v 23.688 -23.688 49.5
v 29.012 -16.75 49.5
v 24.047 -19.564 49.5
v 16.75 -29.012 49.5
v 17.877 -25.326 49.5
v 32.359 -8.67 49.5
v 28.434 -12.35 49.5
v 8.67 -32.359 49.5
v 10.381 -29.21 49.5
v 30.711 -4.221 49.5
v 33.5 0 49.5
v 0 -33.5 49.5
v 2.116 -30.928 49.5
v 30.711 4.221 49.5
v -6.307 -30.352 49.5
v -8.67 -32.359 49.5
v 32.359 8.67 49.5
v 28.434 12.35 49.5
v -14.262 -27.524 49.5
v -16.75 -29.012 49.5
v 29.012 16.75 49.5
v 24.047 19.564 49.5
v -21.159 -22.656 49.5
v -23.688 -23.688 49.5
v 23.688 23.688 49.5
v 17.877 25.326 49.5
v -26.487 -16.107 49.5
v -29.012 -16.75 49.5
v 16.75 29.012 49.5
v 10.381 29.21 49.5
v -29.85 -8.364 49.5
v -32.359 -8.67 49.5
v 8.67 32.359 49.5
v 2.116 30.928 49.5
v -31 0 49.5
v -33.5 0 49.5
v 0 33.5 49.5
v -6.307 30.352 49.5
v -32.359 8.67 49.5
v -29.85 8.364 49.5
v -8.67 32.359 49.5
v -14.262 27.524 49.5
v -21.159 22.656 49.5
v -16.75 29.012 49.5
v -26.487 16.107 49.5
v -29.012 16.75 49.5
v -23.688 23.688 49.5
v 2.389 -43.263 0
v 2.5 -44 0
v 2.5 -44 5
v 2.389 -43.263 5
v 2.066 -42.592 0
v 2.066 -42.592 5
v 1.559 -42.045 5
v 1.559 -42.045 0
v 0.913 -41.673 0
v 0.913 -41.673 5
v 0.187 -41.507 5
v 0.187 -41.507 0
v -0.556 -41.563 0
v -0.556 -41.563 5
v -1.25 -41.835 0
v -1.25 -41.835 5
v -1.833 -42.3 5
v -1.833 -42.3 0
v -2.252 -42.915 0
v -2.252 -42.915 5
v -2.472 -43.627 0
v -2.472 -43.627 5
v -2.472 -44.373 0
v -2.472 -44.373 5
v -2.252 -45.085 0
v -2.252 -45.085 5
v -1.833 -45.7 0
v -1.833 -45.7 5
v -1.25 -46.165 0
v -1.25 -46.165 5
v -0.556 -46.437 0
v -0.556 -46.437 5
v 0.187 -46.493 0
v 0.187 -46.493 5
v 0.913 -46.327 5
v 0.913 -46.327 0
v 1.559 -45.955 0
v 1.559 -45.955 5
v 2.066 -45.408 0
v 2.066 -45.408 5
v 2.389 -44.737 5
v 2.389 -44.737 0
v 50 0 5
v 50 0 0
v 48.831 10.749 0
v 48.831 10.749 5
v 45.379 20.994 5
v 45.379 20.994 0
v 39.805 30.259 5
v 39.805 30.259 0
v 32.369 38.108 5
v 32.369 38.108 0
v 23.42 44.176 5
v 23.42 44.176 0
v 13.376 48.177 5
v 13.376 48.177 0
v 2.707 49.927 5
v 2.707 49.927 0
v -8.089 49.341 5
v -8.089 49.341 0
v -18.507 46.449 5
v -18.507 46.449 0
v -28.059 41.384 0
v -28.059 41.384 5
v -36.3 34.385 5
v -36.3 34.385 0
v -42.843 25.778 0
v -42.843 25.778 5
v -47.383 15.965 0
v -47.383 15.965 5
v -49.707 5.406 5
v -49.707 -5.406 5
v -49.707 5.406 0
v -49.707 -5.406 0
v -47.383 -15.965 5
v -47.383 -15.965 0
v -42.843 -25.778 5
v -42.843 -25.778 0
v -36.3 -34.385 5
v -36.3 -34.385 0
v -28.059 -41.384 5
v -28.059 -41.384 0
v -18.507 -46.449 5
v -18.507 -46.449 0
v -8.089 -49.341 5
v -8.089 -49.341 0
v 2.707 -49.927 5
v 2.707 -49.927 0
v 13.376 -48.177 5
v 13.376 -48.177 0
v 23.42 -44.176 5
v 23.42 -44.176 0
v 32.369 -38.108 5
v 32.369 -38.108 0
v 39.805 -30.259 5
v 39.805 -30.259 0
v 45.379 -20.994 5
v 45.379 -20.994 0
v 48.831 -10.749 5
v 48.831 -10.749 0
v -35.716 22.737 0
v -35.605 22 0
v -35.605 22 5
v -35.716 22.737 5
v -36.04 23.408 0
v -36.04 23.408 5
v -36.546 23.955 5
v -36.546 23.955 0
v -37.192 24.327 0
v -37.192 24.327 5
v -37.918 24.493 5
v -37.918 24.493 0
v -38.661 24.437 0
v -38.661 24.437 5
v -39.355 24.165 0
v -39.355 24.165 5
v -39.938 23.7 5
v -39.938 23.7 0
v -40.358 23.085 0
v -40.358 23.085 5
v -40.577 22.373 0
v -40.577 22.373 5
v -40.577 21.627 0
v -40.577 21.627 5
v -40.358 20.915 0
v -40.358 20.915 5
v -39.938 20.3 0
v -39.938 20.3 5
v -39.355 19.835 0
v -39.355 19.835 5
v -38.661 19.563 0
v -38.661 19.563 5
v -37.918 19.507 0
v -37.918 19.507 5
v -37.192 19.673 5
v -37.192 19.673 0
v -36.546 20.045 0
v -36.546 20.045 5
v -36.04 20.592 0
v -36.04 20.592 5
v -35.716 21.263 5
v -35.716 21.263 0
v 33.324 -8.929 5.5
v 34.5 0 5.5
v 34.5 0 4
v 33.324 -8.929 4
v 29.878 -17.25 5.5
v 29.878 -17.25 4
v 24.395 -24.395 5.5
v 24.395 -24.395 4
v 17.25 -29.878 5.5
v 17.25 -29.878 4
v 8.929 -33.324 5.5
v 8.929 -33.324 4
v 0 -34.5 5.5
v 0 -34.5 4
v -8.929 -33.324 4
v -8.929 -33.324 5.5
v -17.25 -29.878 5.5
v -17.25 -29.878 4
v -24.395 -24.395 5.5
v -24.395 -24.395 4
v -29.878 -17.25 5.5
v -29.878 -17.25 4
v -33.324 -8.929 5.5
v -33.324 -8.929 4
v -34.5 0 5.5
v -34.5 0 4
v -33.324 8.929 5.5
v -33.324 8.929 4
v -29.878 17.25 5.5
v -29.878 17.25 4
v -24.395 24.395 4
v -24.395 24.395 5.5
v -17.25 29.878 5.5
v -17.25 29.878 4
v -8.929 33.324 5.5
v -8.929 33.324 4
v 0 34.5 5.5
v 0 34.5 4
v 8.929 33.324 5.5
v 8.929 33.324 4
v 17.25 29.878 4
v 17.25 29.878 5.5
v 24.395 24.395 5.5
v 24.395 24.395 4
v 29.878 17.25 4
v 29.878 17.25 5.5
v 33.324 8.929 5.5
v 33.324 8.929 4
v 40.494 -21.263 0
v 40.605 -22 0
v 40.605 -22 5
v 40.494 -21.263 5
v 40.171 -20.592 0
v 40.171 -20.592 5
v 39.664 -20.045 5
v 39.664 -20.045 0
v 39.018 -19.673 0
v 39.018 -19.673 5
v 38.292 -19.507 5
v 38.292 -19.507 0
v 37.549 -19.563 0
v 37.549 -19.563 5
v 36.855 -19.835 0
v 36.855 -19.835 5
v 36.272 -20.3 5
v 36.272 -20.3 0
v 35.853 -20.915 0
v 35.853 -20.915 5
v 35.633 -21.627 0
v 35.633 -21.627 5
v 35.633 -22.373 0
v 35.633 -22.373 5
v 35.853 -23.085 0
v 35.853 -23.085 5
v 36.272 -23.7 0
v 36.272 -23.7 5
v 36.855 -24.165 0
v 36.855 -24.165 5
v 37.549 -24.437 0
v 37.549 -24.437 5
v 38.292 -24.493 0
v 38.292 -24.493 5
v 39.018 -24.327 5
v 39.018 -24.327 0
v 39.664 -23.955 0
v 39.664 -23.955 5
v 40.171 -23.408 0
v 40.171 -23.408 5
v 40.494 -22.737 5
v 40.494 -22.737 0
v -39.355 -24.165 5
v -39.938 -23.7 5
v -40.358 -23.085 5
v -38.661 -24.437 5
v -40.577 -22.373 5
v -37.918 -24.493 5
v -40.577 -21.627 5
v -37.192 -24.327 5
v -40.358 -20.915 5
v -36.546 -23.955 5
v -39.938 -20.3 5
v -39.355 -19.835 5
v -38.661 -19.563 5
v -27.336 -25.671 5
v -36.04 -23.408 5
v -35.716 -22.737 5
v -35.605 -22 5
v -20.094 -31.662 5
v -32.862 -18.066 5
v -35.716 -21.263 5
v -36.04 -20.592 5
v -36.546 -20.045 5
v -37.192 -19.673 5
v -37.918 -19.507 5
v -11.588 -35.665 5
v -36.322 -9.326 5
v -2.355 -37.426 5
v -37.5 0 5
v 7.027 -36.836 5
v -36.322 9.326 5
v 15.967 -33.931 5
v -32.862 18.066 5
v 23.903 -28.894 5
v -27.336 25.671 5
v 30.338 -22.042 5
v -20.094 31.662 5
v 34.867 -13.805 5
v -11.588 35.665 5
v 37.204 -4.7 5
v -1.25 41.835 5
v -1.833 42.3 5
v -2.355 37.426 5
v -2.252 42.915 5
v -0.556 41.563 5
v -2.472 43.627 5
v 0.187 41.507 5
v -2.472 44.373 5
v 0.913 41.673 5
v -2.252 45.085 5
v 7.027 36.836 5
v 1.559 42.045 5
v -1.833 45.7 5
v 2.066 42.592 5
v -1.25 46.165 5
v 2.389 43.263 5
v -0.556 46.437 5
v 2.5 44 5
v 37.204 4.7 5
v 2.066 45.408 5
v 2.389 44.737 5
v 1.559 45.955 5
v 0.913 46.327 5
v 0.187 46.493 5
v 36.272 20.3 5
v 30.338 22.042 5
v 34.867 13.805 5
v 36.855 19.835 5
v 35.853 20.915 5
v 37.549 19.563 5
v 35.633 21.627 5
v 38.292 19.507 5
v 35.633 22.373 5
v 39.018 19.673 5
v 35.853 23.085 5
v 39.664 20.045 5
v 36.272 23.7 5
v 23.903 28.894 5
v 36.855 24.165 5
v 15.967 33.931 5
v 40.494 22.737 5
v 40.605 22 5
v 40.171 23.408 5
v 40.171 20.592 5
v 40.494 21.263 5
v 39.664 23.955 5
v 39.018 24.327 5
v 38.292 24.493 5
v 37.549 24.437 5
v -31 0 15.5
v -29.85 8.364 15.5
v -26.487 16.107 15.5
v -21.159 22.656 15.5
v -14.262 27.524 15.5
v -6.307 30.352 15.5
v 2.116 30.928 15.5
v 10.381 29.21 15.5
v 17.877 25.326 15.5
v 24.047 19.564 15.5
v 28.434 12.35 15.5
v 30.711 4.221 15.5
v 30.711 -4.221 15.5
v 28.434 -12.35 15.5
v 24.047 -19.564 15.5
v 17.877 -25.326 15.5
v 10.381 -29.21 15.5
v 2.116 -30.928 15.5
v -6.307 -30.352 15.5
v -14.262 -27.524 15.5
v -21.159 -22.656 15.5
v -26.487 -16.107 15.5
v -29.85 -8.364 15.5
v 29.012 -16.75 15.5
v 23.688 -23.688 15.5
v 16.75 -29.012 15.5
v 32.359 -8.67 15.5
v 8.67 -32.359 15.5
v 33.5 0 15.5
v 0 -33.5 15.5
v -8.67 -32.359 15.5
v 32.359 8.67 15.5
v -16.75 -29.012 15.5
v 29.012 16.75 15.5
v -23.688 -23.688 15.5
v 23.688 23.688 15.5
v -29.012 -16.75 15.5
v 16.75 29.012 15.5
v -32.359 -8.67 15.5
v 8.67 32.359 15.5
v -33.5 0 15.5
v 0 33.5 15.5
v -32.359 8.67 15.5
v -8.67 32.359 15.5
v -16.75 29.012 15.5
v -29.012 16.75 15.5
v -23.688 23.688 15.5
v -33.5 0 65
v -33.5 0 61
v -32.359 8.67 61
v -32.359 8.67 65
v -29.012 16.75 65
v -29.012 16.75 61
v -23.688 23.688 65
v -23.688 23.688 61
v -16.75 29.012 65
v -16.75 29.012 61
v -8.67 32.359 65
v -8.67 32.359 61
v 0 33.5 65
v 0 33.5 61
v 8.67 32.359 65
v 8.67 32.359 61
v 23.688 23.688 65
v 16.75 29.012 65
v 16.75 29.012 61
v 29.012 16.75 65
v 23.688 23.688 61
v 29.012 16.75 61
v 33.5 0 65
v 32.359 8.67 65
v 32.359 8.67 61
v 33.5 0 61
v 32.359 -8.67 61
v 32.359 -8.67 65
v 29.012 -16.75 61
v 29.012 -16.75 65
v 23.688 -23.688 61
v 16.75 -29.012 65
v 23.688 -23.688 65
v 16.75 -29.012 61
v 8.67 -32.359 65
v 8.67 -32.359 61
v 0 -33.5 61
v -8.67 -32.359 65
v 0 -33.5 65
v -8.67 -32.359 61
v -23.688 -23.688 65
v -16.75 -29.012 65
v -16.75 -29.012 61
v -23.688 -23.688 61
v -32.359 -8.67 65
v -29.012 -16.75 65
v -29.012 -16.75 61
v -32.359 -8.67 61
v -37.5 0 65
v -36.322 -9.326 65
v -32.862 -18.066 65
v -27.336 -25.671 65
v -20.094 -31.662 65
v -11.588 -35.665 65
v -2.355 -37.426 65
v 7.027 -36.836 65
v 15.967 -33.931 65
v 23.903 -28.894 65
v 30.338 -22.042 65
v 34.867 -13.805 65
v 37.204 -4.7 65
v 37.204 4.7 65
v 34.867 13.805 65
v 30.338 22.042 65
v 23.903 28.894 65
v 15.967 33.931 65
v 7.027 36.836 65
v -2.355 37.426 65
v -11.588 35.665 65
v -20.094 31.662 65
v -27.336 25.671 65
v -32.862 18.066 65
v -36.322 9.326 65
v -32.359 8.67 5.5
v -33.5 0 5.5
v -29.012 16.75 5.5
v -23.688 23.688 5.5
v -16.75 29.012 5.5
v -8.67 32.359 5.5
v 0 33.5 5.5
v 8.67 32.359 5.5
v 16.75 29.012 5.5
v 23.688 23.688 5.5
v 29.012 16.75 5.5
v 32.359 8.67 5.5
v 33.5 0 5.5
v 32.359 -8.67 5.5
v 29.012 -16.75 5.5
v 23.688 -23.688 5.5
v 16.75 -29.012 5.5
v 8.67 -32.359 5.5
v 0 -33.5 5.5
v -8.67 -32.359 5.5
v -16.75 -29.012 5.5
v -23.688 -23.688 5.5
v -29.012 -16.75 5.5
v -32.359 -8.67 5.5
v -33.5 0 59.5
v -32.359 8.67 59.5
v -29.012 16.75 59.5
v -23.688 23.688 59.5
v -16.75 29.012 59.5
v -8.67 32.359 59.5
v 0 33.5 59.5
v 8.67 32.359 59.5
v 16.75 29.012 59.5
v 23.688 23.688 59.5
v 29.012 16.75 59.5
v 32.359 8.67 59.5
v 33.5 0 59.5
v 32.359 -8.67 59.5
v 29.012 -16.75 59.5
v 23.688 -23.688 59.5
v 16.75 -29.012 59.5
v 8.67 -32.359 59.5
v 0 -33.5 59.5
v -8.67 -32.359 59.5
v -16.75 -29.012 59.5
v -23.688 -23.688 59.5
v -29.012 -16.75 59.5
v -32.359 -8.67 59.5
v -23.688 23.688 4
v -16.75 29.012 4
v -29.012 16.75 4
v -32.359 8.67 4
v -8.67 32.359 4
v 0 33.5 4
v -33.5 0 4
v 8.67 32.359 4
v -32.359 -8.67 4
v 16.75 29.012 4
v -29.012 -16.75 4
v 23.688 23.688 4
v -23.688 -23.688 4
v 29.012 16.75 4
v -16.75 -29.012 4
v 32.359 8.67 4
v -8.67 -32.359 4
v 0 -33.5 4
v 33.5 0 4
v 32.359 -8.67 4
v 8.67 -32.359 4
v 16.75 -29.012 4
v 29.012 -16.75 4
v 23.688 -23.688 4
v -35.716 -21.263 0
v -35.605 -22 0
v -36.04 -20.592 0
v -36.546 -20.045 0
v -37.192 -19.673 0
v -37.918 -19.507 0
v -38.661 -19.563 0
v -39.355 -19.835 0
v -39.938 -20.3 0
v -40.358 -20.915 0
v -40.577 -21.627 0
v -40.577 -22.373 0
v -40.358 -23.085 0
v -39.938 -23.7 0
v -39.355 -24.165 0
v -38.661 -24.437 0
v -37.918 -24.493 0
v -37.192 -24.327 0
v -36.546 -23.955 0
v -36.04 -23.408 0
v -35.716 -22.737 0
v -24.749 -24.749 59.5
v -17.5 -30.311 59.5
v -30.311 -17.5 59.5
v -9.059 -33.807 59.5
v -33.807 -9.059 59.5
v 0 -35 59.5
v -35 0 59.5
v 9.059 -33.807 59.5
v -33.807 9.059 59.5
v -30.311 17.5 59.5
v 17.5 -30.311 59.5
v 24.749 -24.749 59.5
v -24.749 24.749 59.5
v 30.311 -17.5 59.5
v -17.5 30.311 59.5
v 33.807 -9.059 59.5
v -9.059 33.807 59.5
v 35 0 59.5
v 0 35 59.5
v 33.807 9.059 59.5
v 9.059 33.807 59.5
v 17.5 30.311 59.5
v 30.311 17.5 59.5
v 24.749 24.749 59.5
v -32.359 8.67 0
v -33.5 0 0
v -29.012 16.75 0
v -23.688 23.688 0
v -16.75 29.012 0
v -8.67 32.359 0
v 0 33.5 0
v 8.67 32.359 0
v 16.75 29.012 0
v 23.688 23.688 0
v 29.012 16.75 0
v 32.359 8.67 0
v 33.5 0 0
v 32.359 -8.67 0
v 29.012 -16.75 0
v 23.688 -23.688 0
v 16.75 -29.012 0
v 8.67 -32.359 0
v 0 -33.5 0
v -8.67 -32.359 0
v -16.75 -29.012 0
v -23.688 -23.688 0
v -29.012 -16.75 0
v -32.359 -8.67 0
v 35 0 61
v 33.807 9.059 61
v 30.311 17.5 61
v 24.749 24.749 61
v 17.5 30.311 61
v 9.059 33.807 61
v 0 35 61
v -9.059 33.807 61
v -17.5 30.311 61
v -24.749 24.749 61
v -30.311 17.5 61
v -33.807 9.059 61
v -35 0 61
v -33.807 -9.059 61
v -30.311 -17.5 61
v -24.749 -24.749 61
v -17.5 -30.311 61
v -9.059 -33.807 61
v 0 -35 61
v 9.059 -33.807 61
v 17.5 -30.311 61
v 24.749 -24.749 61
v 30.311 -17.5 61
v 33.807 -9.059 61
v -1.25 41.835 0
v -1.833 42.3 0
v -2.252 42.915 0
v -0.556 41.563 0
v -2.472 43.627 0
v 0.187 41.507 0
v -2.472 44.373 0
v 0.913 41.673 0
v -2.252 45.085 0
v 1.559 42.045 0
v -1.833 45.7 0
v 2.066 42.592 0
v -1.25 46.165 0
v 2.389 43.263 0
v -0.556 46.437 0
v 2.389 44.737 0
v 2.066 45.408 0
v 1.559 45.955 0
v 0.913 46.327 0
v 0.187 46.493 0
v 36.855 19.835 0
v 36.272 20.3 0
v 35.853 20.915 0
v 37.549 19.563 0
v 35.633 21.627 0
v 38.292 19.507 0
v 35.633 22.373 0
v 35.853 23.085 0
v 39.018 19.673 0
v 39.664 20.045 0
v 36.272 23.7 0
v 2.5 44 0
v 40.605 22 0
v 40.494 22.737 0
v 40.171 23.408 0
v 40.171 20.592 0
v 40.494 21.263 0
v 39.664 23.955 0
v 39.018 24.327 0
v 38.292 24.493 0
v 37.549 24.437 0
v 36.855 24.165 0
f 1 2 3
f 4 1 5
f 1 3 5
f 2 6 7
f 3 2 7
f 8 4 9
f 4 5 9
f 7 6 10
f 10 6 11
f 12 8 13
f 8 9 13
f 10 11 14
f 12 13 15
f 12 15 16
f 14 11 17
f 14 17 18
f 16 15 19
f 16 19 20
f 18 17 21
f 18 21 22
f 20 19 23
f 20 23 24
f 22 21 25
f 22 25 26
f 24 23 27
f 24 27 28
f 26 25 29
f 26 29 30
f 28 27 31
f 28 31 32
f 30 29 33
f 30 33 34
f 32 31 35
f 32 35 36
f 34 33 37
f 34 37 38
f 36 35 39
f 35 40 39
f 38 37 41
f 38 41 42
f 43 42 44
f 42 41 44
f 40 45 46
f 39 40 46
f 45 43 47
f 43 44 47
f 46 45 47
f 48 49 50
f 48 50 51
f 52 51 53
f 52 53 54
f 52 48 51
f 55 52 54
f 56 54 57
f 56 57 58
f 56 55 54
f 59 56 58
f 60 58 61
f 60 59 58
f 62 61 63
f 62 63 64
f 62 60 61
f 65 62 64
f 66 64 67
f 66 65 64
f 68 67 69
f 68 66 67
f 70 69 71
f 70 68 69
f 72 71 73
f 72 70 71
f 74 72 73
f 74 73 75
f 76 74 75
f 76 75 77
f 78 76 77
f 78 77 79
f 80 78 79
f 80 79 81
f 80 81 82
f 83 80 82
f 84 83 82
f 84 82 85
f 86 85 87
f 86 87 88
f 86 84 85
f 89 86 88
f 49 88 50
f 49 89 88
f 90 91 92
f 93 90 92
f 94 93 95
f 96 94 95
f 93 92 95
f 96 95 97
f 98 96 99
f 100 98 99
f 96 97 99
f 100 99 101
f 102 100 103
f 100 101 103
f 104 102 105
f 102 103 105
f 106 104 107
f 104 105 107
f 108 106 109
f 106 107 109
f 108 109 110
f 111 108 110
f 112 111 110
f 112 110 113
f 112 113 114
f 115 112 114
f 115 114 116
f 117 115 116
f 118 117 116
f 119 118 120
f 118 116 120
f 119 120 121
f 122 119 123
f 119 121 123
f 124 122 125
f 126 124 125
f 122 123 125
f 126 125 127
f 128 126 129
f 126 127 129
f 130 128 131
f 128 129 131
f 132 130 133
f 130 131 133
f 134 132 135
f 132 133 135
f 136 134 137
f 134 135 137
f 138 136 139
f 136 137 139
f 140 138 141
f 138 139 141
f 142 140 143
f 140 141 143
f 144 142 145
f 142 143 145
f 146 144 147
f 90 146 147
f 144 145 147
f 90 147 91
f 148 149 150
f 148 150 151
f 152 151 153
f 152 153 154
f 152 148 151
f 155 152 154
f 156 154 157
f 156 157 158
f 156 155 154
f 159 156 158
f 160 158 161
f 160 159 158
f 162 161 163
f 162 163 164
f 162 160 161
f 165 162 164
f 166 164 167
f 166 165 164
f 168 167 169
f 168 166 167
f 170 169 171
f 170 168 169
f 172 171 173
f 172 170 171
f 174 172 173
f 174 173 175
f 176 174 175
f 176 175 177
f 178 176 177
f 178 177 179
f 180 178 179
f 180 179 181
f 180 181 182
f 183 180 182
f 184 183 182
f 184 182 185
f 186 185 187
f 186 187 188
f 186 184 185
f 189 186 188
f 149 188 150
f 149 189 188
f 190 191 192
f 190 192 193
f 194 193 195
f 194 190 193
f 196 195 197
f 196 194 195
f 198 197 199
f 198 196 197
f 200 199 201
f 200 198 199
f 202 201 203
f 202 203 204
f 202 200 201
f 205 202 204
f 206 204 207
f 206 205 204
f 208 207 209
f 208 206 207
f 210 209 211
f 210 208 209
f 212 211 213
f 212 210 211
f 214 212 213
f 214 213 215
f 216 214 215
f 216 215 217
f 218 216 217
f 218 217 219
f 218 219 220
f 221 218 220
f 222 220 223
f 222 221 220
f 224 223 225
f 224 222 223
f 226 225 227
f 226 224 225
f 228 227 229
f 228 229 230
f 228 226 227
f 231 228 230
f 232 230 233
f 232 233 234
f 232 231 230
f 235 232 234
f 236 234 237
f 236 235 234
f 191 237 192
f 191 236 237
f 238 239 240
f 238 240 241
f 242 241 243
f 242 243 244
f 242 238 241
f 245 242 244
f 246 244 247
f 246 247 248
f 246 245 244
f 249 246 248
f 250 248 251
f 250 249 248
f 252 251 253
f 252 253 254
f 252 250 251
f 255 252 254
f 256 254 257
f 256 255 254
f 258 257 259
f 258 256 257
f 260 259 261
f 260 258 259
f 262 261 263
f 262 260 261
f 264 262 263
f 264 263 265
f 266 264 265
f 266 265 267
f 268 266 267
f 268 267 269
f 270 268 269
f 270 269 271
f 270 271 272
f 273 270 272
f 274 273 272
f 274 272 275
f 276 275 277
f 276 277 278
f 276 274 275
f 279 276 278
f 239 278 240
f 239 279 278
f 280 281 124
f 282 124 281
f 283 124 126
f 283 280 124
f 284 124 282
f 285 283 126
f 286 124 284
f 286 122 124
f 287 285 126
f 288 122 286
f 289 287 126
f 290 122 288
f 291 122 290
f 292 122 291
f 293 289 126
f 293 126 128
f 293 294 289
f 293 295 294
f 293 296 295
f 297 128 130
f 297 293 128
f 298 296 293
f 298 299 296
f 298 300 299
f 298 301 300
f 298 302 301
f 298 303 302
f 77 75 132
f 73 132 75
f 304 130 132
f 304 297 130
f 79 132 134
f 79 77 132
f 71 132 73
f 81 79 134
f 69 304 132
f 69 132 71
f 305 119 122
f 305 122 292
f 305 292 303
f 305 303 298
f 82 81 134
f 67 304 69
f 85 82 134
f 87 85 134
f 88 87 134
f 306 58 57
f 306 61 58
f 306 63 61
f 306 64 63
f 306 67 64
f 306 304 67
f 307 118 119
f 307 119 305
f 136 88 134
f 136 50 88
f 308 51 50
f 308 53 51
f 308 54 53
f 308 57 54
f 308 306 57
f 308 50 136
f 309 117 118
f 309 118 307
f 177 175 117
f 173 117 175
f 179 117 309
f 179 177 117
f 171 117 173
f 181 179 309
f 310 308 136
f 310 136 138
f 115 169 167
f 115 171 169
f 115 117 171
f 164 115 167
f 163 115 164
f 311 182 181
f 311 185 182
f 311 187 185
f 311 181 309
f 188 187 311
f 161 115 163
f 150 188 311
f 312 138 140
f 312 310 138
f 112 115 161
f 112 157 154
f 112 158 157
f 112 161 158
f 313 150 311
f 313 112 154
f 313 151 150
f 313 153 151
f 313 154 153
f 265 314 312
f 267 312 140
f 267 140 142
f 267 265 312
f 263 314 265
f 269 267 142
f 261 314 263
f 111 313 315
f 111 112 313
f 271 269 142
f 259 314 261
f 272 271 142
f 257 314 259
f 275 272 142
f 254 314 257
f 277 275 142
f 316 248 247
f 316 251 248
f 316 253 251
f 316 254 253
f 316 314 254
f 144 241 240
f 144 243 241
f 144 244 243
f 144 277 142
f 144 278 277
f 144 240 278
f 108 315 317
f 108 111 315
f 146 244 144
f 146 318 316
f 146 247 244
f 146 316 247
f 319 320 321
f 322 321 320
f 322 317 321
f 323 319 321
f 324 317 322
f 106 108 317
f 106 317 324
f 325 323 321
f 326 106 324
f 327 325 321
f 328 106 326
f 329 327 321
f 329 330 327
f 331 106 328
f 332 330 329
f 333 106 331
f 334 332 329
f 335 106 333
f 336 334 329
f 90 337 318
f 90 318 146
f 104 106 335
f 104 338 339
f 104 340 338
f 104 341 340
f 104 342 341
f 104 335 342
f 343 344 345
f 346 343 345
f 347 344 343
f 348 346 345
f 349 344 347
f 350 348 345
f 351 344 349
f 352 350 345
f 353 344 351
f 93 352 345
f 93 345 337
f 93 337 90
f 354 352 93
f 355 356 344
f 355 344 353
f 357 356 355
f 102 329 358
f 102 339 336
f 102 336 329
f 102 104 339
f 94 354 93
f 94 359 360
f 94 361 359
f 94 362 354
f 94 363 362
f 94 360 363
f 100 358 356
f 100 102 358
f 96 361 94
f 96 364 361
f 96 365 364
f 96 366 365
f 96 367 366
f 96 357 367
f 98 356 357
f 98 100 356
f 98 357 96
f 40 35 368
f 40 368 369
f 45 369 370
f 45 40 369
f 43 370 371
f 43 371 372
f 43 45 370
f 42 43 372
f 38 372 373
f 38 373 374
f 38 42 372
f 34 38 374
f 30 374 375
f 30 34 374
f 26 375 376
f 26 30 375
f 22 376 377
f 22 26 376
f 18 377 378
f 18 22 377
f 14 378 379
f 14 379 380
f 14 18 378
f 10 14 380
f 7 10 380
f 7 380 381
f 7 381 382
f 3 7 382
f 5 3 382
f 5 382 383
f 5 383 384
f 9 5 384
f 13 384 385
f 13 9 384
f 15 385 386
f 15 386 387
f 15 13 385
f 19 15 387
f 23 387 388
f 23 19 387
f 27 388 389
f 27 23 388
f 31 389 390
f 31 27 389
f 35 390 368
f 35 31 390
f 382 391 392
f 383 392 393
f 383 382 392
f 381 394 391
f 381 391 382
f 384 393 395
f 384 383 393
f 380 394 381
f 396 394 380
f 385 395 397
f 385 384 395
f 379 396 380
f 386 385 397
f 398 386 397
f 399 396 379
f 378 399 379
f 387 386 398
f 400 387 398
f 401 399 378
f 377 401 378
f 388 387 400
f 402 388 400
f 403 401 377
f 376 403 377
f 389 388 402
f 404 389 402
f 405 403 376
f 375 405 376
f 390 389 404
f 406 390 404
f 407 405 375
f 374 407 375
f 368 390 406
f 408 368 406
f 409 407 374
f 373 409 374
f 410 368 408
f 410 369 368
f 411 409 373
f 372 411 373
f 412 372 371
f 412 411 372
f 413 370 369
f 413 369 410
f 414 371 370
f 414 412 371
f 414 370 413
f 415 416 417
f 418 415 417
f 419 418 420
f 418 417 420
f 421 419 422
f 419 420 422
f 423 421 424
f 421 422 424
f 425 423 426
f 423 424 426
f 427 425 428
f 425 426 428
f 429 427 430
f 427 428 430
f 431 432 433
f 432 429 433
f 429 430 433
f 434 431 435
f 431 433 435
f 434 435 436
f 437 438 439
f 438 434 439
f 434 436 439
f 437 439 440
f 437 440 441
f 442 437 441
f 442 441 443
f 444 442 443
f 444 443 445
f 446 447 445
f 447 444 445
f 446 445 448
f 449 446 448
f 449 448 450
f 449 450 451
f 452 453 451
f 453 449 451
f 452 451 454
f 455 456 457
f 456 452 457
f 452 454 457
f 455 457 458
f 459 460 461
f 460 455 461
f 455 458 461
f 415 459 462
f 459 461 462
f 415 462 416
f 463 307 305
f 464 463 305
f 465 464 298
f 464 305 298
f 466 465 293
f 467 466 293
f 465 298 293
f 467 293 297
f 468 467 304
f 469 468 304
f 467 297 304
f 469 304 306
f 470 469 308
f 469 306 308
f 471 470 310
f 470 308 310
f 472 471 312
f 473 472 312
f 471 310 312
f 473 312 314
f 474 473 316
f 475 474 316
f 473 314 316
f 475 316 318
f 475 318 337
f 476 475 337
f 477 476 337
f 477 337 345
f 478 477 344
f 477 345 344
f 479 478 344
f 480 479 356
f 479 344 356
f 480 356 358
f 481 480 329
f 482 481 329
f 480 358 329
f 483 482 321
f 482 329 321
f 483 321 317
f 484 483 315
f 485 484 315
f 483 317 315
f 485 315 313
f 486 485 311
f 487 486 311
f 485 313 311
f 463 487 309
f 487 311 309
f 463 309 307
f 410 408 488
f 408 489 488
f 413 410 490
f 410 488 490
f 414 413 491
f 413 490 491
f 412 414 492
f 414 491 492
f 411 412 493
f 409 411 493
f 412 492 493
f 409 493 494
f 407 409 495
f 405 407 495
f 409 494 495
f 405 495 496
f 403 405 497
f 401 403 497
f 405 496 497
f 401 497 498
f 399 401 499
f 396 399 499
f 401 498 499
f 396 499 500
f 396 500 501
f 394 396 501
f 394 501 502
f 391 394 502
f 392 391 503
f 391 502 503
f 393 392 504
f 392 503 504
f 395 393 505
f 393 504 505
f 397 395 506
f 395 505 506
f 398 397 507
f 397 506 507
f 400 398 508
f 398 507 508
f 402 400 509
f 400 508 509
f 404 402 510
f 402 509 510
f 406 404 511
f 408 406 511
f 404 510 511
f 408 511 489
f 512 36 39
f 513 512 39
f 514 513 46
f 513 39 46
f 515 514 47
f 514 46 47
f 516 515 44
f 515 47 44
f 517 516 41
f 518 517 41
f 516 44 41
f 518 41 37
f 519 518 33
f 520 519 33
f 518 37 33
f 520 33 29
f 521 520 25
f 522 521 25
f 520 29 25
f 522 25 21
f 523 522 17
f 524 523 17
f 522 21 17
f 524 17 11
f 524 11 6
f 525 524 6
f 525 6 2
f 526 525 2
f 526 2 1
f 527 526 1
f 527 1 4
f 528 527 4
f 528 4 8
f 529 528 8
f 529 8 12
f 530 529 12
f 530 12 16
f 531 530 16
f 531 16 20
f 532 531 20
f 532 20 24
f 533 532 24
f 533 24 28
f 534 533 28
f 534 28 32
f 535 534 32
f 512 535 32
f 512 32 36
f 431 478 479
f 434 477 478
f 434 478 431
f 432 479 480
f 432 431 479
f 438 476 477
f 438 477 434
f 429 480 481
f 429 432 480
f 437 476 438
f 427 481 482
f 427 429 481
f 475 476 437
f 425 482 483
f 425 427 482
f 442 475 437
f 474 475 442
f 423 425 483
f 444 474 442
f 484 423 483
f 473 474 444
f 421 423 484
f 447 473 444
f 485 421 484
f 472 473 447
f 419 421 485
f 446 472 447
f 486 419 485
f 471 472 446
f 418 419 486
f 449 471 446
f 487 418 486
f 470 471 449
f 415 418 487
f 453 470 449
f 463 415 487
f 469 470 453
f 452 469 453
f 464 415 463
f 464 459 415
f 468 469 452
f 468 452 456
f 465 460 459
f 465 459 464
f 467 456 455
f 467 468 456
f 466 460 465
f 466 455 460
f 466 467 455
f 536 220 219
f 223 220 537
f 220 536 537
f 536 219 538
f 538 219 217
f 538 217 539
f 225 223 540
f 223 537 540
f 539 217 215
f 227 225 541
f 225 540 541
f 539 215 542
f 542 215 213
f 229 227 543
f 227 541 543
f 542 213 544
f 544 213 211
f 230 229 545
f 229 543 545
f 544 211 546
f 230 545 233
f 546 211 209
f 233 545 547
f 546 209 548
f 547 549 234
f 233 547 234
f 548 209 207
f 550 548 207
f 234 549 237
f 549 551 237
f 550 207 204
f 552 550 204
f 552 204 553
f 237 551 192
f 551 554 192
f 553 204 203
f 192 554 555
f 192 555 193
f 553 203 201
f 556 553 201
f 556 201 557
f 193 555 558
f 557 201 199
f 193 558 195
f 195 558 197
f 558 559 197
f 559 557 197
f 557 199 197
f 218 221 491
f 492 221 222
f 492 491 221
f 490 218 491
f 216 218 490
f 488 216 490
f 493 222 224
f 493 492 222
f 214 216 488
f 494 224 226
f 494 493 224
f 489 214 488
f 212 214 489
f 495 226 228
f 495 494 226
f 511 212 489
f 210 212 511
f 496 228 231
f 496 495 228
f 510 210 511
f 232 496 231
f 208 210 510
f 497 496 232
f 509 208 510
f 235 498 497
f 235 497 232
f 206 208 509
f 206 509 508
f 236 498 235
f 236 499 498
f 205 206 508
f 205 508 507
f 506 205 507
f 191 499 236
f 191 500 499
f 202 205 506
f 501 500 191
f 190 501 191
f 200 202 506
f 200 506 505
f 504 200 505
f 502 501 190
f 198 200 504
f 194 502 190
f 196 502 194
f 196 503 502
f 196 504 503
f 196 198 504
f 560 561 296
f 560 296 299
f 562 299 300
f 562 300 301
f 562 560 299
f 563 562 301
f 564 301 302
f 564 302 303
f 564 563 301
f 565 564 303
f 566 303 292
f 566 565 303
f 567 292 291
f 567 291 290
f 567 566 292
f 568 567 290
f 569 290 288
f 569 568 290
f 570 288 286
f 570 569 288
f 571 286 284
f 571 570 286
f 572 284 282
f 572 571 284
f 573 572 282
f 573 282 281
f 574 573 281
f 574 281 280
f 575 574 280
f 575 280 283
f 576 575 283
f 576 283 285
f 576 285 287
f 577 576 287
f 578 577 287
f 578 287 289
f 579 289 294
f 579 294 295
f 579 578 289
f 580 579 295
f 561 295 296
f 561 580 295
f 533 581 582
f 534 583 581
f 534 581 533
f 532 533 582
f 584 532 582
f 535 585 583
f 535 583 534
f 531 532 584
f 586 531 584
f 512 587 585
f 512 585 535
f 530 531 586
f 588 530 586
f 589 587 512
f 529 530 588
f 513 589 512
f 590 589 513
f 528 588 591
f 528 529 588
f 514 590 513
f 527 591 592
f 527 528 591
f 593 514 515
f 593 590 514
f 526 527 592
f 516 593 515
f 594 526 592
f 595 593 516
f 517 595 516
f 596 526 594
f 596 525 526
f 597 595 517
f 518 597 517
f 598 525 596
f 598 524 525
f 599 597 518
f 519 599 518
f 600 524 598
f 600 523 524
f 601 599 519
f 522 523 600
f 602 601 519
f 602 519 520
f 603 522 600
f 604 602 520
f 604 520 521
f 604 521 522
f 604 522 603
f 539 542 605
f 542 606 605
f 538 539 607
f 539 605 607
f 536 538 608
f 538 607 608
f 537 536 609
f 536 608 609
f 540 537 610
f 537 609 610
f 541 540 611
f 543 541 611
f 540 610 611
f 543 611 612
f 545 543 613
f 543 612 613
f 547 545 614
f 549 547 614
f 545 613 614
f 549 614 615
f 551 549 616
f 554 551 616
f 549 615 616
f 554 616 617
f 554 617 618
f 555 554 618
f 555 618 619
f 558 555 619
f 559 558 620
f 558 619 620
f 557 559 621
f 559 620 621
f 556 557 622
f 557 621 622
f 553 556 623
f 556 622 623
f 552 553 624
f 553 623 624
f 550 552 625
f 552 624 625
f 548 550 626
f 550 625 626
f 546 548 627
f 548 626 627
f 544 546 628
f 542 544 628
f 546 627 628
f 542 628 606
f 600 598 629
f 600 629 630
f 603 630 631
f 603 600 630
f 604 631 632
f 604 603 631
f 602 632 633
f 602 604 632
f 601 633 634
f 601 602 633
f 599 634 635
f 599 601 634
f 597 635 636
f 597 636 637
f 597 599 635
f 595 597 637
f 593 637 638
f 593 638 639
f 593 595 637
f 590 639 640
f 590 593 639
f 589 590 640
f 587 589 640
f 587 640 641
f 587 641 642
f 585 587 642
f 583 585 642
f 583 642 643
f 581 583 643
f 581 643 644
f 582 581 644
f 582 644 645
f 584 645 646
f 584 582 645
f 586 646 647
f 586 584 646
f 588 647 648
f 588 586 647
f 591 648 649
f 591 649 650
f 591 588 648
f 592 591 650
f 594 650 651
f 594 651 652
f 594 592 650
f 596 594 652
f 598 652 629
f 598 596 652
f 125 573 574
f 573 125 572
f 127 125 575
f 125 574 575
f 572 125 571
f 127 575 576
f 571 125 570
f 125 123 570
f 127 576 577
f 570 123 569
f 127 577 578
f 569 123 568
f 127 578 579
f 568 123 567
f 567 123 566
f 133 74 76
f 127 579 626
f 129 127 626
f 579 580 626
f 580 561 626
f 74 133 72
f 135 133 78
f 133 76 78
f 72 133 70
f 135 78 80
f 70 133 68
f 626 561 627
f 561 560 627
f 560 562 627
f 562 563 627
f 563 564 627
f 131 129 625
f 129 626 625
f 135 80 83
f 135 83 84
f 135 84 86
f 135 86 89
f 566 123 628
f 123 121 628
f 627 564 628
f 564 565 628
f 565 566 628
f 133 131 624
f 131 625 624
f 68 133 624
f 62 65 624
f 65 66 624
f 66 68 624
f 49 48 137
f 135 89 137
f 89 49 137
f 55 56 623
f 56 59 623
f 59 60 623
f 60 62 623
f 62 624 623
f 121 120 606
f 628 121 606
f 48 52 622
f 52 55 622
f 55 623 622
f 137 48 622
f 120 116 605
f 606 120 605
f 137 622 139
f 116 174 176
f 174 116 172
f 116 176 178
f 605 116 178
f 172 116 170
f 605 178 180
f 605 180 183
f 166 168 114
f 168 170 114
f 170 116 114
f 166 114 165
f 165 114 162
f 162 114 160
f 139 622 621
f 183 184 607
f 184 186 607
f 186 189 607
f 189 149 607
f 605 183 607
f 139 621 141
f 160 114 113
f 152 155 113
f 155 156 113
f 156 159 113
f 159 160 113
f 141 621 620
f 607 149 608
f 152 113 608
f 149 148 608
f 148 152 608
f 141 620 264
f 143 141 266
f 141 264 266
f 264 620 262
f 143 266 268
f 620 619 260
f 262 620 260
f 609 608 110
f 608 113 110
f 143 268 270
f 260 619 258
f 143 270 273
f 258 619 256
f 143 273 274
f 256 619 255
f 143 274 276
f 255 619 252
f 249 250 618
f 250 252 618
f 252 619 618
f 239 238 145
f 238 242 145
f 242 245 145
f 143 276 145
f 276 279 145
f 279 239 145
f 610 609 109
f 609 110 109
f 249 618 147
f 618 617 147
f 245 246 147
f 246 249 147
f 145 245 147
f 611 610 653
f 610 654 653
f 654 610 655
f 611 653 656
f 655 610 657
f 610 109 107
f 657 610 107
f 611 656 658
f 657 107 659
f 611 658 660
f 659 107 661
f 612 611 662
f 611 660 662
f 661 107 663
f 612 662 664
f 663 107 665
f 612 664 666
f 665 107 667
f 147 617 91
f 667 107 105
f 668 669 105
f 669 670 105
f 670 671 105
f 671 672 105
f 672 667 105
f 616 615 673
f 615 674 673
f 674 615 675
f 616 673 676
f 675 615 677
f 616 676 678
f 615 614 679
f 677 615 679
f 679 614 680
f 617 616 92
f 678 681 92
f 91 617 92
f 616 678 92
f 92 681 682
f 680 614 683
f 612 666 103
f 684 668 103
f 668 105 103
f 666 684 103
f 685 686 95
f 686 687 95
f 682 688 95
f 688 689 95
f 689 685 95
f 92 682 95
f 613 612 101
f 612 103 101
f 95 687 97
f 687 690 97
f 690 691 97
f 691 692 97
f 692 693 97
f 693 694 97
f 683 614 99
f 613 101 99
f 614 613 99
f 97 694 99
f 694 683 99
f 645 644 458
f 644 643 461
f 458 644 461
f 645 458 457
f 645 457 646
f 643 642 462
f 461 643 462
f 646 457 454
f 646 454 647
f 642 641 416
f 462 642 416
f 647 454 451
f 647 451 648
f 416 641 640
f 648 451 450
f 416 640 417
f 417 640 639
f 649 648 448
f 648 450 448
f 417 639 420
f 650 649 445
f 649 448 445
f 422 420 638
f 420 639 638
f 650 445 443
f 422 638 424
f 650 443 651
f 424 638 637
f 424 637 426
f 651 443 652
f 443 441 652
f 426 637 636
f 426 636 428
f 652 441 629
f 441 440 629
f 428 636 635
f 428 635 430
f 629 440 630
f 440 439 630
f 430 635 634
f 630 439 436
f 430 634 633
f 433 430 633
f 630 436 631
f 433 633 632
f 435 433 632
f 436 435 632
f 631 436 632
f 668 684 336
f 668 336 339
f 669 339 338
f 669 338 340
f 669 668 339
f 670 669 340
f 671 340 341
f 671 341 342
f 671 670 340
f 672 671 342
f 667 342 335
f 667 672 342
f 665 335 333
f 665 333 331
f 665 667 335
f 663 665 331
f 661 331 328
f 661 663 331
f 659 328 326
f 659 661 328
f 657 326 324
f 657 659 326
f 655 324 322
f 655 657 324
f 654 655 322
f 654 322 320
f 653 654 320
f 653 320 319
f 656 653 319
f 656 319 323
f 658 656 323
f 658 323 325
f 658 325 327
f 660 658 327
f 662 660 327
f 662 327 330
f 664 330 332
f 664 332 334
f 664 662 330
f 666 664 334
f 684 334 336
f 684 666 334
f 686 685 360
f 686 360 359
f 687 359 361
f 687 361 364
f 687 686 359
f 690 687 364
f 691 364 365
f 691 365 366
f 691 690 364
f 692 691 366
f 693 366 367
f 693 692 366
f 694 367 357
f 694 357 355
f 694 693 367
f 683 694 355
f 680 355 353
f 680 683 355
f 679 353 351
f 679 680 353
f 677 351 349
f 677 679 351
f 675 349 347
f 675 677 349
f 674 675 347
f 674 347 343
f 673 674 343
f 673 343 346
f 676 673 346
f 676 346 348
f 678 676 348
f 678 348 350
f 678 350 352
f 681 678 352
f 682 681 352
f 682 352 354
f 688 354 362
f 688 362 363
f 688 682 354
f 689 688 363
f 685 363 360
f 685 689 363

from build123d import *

# Parameters (mm, degrees)
SKETCH1_R                = 50
SKETCH1_R_2              = 2.5
BOSS_EXTRUDE1_DEPTH      = 5
SKETCH2_R                = 37.5
SKETCH2_R_2              = 33.5
BOSS_EXTRUDE2_DEPTH      = 60
SKETCH3_R                = 33.5
CUT_EXTRUDE1_DEPTH       = 50
BOSS_EXTRUDE4_DEPTH      = 17
BOSS_EXTRUDE4_DEPTH_BACK = 17
SKETCH5_R                = 35
SKETCH5_R_2              = 31
CUT_EXTRUDE2_START       = 10
SKETCH6_R                = 34.5
CUT_EXTRUDE2_DEPTH       = 1.5
CUT_EXTRUDE3_START       = 10
SKETCH7_R                = 35
CUT_EXTRUDE3_DEPTH       = 1.5


with BuildPart() as part:
    # Sketch1 → Boss-Extrude1 (new body)
    with BuildSketch(Plane.XY):
        Circle(SKETCH1_R)
        with Locations((0, 44)):
            Circle(SKETCH1_R_2, mode=Mode.SUBTRACT)
        with Locations((38.105117767, 22)):
            Circle(SKETCH1_R_2, mode=Mode.SUBTRACT)
        with Locations((38.105117767, -22)):
            Circle(SKETCH1_R_2, mode=Mode.SUBTRACT)
        with Locations((0, -44)):
            Circle(SKETCH1_R_2, mode=Mode.SUBTRACT)
        with Locations((-38.105117767, -22)):
            Circle(SKETCH1_R_2, mode=Mode.SUBTRACT)
        with Locations((-38.105117767, 22)):
            Circle(SKETCH1_R_2, mode=Mode.SUBTRACT)
    extrude(amount=BOSS_EXTRUDE1_DEPTH)

    # Sketch2 → Boss-Extrude2 (add)
    with BuildSketch(Plane.XY.offset(5)):
        with Locations(Location((0, 0, 0), (0, 0, 180))):
            Circle(SKETCH2_R)
        with Locations(Location((0, 0, 0), (0, 0, 180))):
            Circle(SKETCH2_R_2, mode=Mode.SUBTRACT)
    extrude(amount=BOSS_EXTRUDE2_DEPTH)

    # Sketch3 → Cut-Extrude1 (cut)
    with BuildSketch(Plane(origin=(0, 0, 0), x_dir=(-1, 0, 0), z_dir=(0, 0, -1))):
        Circle(SKETCH3_R)
    extrude(amount=-CUT_EXTRUDE1_DEPTH, mode=Mode.SUBTRACT)

    # Sketch5 → Boss-Extrude4 (add, two sides: drawn at the far end of the back side and taken through both)
    with BuildSketch(Plane(origin=(0, 0, 32.5), x_dir=(-1, 0, 0), z_dir=(0, 0, -1)).offset(-BOSS_EXTRUDE4_DEPTH_BACK)):
        Circle(SKETCH5_R)
        Circle(SKETCH5_R_2, mode=Mode.SUBTRACT)
    extrude(amount=BOSS_EXTRUDE4_DEPTH + BOSS_EXTRUDE4_DEPTH_BACK)

    # Sketch6 → Cut-Extrude2 (cut)
    with BuildSketch(Plane(origin=(0, 0, 15.5), x_dir=(-1, 0, 0), z_dir=(0, 0, -1)).offset(CUT_EXTRUDE2_START)):
        with Locations(Location((0, 0, 0), (0, 0, 180))):
            Circle(SKETCH6_R)
    extrude(amount=CUT_EXTRUDE2_DEPTH, mode=Mode.SUBTRACT)

    # Sketch7 → Cut-Extrude3 (cut)
    with BuildSketch(Plane.XY.offset(49.5).offset(CUT_EXTRUDE3_START)):
        Circle(SKETCH7_R)
    extrude(amount=CUT_EXTRUDE3_DEPTH, mode=Mode.SUBTRACT)


solid = part.part
